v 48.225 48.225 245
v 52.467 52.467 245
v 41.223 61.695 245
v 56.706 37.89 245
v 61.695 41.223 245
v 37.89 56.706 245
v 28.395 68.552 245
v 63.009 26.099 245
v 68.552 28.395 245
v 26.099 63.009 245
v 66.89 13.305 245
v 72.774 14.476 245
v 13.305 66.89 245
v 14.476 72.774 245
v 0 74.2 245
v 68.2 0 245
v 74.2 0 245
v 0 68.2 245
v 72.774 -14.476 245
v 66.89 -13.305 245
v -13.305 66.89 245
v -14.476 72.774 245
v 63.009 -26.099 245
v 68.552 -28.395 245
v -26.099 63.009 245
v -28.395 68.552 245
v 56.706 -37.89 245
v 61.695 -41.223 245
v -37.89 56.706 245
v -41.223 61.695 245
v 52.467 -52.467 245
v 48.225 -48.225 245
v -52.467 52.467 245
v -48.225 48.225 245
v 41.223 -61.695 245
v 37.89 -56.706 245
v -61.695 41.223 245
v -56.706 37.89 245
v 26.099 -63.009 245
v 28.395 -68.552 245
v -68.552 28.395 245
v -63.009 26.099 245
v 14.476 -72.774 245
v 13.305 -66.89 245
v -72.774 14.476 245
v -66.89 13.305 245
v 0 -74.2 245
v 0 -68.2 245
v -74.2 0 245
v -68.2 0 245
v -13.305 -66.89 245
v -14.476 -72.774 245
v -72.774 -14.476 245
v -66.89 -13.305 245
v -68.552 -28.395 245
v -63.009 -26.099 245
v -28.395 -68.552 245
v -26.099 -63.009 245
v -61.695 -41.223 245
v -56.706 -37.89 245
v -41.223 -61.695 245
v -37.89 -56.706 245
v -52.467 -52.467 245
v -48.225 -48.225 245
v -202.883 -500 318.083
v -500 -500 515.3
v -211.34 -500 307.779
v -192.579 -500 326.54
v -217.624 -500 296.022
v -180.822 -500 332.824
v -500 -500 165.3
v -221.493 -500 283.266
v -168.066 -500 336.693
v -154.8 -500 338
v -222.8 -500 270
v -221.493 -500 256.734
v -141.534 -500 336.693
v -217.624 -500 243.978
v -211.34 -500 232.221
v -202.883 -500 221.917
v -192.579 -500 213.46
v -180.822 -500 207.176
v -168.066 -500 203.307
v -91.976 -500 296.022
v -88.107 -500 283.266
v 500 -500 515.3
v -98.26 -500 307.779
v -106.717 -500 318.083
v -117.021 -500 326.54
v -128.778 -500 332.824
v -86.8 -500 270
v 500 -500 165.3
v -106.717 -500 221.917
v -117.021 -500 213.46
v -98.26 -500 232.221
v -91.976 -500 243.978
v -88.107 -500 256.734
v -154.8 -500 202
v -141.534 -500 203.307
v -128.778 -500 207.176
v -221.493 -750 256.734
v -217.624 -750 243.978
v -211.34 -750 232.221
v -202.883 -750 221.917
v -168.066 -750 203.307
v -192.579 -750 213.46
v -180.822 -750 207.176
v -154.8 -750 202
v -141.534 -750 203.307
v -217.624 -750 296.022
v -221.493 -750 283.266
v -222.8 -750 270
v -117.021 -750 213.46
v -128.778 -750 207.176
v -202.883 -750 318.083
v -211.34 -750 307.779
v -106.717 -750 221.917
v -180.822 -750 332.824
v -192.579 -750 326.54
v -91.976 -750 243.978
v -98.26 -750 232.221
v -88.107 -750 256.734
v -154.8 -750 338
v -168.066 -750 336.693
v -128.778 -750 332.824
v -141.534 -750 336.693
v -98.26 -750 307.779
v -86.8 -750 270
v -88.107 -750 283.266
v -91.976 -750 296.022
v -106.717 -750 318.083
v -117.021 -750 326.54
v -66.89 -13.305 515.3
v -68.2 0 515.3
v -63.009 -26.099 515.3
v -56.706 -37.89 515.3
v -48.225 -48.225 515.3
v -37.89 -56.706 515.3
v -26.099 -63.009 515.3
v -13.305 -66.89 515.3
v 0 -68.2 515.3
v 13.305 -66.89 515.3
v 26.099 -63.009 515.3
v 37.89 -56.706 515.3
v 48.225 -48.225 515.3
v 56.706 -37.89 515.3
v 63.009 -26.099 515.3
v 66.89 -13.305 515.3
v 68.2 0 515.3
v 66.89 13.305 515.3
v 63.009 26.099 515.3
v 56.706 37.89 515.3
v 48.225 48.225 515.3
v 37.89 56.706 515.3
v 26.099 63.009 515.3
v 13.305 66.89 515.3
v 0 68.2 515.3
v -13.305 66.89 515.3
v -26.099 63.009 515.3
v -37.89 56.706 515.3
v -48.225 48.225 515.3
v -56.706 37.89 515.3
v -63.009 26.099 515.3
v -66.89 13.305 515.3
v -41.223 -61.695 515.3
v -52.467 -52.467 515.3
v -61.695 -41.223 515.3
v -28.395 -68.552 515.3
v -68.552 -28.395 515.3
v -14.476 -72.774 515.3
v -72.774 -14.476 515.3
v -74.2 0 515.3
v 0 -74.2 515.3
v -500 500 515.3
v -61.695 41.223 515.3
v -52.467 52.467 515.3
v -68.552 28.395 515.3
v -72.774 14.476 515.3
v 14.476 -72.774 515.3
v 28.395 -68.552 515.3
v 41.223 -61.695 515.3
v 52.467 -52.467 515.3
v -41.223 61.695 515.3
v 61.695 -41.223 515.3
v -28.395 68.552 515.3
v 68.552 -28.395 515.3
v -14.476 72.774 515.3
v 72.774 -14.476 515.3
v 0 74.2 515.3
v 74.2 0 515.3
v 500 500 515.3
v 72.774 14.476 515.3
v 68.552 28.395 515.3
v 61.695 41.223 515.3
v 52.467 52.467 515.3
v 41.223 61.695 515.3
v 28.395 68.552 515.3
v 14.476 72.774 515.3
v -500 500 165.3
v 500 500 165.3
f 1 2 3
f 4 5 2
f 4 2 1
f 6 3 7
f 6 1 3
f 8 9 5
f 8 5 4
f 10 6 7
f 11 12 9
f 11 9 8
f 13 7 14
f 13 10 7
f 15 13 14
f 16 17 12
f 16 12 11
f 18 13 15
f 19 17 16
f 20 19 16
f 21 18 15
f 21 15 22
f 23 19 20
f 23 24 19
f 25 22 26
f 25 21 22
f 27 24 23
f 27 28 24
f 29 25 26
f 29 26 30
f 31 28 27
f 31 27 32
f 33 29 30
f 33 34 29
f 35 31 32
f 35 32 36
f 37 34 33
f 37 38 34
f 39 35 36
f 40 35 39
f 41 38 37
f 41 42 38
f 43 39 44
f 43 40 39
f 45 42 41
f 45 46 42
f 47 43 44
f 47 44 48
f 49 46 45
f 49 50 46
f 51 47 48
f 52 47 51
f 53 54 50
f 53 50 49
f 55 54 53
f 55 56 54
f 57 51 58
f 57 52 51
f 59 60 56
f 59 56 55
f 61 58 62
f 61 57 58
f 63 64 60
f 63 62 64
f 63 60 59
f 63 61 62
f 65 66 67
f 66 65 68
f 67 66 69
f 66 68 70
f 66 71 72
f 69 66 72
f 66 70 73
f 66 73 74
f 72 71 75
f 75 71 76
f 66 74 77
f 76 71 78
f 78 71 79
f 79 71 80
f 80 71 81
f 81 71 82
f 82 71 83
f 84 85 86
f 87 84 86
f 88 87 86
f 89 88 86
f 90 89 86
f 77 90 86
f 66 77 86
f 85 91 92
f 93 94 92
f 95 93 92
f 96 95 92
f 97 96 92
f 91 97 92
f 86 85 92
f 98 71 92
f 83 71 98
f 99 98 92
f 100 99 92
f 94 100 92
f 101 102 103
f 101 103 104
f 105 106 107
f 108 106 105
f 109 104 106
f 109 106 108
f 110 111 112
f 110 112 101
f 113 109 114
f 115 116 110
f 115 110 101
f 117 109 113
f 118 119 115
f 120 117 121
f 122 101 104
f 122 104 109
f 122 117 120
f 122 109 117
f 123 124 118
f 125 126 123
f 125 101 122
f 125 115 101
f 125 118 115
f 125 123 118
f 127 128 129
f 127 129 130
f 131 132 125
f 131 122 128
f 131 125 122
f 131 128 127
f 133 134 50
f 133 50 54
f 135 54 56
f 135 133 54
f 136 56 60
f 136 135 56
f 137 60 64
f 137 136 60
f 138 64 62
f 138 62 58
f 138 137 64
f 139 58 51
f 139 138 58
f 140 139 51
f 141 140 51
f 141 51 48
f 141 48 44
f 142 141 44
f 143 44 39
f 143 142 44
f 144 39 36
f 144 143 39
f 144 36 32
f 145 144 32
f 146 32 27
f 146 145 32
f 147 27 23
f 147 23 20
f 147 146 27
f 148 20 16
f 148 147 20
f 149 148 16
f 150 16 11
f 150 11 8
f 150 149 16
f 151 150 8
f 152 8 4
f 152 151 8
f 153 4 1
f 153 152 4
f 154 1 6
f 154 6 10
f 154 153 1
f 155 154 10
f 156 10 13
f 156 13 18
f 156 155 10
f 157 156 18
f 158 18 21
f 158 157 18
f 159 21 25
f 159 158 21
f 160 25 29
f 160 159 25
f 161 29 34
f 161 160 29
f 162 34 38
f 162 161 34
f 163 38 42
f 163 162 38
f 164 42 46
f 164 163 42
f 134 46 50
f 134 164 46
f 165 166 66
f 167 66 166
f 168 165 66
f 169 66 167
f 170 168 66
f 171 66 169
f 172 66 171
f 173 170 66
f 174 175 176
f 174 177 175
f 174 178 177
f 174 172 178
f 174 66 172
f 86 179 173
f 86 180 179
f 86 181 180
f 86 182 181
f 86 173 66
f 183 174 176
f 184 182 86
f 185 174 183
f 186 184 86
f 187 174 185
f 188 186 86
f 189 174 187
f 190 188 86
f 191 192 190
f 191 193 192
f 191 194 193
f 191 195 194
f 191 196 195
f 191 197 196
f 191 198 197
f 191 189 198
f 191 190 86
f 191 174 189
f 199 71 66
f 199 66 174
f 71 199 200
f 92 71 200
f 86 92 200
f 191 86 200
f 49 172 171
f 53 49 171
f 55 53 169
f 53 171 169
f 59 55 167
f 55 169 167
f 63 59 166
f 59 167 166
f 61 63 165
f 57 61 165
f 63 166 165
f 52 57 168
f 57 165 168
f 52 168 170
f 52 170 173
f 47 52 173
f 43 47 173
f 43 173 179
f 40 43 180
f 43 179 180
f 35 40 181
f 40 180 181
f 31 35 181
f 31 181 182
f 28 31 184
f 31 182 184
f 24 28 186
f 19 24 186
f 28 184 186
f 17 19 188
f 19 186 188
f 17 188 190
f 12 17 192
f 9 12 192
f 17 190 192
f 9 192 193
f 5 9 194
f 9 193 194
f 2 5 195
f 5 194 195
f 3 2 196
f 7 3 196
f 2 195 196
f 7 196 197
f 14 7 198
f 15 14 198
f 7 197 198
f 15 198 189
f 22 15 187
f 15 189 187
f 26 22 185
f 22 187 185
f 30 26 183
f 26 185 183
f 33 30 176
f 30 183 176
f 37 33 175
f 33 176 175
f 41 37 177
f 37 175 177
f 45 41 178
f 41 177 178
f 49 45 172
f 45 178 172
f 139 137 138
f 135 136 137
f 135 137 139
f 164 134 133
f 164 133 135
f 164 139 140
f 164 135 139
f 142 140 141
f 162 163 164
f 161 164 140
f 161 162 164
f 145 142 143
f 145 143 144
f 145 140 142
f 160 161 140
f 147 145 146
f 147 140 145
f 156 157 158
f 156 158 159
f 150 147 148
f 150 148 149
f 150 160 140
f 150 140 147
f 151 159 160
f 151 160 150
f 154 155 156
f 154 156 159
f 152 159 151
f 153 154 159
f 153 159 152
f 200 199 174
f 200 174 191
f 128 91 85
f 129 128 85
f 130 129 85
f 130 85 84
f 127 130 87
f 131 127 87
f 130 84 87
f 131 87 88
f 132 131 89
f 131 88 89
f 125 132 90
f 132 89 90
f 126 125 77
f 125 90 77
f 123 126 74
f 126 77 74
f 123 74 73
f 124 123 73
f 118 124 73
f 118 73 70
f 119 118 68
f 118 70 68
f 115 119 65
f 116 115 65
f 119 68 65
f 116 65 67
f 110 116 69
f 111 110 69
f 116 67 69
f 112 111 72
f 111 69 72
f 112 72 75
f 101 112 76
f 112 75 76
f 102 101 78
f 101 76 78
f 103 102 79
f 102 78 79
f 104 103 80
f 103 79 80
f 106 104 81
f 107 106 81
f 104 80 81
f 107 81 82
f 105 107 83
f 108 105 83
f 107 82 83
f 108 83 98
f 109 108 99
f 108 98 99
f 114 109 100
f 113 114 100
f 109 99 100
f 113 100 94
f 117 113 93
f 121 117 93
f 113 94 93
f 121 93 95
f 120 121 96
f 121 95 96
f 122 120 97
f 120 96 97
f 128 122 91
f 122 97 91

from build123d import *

# Parameters (mm, degrees)
F2_W     = 1000
F2_H     = 1000
F3_DEPTH = 350
F0_W     = 6
F0_H     = 500
F5_R     = 68
F6_DEPTH = 250


with BuildPart() as f3:
    # F2 (on offset) → F3 (new body)
    with BuildSketch(Plane.XY.offset(165.3)):
        Rectangle(F2_W, F2_H)
    extrude(amount=F3_DEPTH)

    # F0 (on Front) → F4 (revolve, cut)
    with BuildSketch(Plane.XZ):
        with Locations((-71.2, 495)):
            Rectangle(F0_W, F0_H)
    revolve(axis=Axis((0, 0, 278.492689), (0, 0, 1)), mode=Mode.SUBTRACT)

    # F5 (on face) → F6 (join)
    with BuildSketch(Plane.XZ.offset(500)):
        with Locations((-154.8, 270)):
            Circle(F5_R)
    extrude(amount=F6_DEPTH)


solid = f3.part
